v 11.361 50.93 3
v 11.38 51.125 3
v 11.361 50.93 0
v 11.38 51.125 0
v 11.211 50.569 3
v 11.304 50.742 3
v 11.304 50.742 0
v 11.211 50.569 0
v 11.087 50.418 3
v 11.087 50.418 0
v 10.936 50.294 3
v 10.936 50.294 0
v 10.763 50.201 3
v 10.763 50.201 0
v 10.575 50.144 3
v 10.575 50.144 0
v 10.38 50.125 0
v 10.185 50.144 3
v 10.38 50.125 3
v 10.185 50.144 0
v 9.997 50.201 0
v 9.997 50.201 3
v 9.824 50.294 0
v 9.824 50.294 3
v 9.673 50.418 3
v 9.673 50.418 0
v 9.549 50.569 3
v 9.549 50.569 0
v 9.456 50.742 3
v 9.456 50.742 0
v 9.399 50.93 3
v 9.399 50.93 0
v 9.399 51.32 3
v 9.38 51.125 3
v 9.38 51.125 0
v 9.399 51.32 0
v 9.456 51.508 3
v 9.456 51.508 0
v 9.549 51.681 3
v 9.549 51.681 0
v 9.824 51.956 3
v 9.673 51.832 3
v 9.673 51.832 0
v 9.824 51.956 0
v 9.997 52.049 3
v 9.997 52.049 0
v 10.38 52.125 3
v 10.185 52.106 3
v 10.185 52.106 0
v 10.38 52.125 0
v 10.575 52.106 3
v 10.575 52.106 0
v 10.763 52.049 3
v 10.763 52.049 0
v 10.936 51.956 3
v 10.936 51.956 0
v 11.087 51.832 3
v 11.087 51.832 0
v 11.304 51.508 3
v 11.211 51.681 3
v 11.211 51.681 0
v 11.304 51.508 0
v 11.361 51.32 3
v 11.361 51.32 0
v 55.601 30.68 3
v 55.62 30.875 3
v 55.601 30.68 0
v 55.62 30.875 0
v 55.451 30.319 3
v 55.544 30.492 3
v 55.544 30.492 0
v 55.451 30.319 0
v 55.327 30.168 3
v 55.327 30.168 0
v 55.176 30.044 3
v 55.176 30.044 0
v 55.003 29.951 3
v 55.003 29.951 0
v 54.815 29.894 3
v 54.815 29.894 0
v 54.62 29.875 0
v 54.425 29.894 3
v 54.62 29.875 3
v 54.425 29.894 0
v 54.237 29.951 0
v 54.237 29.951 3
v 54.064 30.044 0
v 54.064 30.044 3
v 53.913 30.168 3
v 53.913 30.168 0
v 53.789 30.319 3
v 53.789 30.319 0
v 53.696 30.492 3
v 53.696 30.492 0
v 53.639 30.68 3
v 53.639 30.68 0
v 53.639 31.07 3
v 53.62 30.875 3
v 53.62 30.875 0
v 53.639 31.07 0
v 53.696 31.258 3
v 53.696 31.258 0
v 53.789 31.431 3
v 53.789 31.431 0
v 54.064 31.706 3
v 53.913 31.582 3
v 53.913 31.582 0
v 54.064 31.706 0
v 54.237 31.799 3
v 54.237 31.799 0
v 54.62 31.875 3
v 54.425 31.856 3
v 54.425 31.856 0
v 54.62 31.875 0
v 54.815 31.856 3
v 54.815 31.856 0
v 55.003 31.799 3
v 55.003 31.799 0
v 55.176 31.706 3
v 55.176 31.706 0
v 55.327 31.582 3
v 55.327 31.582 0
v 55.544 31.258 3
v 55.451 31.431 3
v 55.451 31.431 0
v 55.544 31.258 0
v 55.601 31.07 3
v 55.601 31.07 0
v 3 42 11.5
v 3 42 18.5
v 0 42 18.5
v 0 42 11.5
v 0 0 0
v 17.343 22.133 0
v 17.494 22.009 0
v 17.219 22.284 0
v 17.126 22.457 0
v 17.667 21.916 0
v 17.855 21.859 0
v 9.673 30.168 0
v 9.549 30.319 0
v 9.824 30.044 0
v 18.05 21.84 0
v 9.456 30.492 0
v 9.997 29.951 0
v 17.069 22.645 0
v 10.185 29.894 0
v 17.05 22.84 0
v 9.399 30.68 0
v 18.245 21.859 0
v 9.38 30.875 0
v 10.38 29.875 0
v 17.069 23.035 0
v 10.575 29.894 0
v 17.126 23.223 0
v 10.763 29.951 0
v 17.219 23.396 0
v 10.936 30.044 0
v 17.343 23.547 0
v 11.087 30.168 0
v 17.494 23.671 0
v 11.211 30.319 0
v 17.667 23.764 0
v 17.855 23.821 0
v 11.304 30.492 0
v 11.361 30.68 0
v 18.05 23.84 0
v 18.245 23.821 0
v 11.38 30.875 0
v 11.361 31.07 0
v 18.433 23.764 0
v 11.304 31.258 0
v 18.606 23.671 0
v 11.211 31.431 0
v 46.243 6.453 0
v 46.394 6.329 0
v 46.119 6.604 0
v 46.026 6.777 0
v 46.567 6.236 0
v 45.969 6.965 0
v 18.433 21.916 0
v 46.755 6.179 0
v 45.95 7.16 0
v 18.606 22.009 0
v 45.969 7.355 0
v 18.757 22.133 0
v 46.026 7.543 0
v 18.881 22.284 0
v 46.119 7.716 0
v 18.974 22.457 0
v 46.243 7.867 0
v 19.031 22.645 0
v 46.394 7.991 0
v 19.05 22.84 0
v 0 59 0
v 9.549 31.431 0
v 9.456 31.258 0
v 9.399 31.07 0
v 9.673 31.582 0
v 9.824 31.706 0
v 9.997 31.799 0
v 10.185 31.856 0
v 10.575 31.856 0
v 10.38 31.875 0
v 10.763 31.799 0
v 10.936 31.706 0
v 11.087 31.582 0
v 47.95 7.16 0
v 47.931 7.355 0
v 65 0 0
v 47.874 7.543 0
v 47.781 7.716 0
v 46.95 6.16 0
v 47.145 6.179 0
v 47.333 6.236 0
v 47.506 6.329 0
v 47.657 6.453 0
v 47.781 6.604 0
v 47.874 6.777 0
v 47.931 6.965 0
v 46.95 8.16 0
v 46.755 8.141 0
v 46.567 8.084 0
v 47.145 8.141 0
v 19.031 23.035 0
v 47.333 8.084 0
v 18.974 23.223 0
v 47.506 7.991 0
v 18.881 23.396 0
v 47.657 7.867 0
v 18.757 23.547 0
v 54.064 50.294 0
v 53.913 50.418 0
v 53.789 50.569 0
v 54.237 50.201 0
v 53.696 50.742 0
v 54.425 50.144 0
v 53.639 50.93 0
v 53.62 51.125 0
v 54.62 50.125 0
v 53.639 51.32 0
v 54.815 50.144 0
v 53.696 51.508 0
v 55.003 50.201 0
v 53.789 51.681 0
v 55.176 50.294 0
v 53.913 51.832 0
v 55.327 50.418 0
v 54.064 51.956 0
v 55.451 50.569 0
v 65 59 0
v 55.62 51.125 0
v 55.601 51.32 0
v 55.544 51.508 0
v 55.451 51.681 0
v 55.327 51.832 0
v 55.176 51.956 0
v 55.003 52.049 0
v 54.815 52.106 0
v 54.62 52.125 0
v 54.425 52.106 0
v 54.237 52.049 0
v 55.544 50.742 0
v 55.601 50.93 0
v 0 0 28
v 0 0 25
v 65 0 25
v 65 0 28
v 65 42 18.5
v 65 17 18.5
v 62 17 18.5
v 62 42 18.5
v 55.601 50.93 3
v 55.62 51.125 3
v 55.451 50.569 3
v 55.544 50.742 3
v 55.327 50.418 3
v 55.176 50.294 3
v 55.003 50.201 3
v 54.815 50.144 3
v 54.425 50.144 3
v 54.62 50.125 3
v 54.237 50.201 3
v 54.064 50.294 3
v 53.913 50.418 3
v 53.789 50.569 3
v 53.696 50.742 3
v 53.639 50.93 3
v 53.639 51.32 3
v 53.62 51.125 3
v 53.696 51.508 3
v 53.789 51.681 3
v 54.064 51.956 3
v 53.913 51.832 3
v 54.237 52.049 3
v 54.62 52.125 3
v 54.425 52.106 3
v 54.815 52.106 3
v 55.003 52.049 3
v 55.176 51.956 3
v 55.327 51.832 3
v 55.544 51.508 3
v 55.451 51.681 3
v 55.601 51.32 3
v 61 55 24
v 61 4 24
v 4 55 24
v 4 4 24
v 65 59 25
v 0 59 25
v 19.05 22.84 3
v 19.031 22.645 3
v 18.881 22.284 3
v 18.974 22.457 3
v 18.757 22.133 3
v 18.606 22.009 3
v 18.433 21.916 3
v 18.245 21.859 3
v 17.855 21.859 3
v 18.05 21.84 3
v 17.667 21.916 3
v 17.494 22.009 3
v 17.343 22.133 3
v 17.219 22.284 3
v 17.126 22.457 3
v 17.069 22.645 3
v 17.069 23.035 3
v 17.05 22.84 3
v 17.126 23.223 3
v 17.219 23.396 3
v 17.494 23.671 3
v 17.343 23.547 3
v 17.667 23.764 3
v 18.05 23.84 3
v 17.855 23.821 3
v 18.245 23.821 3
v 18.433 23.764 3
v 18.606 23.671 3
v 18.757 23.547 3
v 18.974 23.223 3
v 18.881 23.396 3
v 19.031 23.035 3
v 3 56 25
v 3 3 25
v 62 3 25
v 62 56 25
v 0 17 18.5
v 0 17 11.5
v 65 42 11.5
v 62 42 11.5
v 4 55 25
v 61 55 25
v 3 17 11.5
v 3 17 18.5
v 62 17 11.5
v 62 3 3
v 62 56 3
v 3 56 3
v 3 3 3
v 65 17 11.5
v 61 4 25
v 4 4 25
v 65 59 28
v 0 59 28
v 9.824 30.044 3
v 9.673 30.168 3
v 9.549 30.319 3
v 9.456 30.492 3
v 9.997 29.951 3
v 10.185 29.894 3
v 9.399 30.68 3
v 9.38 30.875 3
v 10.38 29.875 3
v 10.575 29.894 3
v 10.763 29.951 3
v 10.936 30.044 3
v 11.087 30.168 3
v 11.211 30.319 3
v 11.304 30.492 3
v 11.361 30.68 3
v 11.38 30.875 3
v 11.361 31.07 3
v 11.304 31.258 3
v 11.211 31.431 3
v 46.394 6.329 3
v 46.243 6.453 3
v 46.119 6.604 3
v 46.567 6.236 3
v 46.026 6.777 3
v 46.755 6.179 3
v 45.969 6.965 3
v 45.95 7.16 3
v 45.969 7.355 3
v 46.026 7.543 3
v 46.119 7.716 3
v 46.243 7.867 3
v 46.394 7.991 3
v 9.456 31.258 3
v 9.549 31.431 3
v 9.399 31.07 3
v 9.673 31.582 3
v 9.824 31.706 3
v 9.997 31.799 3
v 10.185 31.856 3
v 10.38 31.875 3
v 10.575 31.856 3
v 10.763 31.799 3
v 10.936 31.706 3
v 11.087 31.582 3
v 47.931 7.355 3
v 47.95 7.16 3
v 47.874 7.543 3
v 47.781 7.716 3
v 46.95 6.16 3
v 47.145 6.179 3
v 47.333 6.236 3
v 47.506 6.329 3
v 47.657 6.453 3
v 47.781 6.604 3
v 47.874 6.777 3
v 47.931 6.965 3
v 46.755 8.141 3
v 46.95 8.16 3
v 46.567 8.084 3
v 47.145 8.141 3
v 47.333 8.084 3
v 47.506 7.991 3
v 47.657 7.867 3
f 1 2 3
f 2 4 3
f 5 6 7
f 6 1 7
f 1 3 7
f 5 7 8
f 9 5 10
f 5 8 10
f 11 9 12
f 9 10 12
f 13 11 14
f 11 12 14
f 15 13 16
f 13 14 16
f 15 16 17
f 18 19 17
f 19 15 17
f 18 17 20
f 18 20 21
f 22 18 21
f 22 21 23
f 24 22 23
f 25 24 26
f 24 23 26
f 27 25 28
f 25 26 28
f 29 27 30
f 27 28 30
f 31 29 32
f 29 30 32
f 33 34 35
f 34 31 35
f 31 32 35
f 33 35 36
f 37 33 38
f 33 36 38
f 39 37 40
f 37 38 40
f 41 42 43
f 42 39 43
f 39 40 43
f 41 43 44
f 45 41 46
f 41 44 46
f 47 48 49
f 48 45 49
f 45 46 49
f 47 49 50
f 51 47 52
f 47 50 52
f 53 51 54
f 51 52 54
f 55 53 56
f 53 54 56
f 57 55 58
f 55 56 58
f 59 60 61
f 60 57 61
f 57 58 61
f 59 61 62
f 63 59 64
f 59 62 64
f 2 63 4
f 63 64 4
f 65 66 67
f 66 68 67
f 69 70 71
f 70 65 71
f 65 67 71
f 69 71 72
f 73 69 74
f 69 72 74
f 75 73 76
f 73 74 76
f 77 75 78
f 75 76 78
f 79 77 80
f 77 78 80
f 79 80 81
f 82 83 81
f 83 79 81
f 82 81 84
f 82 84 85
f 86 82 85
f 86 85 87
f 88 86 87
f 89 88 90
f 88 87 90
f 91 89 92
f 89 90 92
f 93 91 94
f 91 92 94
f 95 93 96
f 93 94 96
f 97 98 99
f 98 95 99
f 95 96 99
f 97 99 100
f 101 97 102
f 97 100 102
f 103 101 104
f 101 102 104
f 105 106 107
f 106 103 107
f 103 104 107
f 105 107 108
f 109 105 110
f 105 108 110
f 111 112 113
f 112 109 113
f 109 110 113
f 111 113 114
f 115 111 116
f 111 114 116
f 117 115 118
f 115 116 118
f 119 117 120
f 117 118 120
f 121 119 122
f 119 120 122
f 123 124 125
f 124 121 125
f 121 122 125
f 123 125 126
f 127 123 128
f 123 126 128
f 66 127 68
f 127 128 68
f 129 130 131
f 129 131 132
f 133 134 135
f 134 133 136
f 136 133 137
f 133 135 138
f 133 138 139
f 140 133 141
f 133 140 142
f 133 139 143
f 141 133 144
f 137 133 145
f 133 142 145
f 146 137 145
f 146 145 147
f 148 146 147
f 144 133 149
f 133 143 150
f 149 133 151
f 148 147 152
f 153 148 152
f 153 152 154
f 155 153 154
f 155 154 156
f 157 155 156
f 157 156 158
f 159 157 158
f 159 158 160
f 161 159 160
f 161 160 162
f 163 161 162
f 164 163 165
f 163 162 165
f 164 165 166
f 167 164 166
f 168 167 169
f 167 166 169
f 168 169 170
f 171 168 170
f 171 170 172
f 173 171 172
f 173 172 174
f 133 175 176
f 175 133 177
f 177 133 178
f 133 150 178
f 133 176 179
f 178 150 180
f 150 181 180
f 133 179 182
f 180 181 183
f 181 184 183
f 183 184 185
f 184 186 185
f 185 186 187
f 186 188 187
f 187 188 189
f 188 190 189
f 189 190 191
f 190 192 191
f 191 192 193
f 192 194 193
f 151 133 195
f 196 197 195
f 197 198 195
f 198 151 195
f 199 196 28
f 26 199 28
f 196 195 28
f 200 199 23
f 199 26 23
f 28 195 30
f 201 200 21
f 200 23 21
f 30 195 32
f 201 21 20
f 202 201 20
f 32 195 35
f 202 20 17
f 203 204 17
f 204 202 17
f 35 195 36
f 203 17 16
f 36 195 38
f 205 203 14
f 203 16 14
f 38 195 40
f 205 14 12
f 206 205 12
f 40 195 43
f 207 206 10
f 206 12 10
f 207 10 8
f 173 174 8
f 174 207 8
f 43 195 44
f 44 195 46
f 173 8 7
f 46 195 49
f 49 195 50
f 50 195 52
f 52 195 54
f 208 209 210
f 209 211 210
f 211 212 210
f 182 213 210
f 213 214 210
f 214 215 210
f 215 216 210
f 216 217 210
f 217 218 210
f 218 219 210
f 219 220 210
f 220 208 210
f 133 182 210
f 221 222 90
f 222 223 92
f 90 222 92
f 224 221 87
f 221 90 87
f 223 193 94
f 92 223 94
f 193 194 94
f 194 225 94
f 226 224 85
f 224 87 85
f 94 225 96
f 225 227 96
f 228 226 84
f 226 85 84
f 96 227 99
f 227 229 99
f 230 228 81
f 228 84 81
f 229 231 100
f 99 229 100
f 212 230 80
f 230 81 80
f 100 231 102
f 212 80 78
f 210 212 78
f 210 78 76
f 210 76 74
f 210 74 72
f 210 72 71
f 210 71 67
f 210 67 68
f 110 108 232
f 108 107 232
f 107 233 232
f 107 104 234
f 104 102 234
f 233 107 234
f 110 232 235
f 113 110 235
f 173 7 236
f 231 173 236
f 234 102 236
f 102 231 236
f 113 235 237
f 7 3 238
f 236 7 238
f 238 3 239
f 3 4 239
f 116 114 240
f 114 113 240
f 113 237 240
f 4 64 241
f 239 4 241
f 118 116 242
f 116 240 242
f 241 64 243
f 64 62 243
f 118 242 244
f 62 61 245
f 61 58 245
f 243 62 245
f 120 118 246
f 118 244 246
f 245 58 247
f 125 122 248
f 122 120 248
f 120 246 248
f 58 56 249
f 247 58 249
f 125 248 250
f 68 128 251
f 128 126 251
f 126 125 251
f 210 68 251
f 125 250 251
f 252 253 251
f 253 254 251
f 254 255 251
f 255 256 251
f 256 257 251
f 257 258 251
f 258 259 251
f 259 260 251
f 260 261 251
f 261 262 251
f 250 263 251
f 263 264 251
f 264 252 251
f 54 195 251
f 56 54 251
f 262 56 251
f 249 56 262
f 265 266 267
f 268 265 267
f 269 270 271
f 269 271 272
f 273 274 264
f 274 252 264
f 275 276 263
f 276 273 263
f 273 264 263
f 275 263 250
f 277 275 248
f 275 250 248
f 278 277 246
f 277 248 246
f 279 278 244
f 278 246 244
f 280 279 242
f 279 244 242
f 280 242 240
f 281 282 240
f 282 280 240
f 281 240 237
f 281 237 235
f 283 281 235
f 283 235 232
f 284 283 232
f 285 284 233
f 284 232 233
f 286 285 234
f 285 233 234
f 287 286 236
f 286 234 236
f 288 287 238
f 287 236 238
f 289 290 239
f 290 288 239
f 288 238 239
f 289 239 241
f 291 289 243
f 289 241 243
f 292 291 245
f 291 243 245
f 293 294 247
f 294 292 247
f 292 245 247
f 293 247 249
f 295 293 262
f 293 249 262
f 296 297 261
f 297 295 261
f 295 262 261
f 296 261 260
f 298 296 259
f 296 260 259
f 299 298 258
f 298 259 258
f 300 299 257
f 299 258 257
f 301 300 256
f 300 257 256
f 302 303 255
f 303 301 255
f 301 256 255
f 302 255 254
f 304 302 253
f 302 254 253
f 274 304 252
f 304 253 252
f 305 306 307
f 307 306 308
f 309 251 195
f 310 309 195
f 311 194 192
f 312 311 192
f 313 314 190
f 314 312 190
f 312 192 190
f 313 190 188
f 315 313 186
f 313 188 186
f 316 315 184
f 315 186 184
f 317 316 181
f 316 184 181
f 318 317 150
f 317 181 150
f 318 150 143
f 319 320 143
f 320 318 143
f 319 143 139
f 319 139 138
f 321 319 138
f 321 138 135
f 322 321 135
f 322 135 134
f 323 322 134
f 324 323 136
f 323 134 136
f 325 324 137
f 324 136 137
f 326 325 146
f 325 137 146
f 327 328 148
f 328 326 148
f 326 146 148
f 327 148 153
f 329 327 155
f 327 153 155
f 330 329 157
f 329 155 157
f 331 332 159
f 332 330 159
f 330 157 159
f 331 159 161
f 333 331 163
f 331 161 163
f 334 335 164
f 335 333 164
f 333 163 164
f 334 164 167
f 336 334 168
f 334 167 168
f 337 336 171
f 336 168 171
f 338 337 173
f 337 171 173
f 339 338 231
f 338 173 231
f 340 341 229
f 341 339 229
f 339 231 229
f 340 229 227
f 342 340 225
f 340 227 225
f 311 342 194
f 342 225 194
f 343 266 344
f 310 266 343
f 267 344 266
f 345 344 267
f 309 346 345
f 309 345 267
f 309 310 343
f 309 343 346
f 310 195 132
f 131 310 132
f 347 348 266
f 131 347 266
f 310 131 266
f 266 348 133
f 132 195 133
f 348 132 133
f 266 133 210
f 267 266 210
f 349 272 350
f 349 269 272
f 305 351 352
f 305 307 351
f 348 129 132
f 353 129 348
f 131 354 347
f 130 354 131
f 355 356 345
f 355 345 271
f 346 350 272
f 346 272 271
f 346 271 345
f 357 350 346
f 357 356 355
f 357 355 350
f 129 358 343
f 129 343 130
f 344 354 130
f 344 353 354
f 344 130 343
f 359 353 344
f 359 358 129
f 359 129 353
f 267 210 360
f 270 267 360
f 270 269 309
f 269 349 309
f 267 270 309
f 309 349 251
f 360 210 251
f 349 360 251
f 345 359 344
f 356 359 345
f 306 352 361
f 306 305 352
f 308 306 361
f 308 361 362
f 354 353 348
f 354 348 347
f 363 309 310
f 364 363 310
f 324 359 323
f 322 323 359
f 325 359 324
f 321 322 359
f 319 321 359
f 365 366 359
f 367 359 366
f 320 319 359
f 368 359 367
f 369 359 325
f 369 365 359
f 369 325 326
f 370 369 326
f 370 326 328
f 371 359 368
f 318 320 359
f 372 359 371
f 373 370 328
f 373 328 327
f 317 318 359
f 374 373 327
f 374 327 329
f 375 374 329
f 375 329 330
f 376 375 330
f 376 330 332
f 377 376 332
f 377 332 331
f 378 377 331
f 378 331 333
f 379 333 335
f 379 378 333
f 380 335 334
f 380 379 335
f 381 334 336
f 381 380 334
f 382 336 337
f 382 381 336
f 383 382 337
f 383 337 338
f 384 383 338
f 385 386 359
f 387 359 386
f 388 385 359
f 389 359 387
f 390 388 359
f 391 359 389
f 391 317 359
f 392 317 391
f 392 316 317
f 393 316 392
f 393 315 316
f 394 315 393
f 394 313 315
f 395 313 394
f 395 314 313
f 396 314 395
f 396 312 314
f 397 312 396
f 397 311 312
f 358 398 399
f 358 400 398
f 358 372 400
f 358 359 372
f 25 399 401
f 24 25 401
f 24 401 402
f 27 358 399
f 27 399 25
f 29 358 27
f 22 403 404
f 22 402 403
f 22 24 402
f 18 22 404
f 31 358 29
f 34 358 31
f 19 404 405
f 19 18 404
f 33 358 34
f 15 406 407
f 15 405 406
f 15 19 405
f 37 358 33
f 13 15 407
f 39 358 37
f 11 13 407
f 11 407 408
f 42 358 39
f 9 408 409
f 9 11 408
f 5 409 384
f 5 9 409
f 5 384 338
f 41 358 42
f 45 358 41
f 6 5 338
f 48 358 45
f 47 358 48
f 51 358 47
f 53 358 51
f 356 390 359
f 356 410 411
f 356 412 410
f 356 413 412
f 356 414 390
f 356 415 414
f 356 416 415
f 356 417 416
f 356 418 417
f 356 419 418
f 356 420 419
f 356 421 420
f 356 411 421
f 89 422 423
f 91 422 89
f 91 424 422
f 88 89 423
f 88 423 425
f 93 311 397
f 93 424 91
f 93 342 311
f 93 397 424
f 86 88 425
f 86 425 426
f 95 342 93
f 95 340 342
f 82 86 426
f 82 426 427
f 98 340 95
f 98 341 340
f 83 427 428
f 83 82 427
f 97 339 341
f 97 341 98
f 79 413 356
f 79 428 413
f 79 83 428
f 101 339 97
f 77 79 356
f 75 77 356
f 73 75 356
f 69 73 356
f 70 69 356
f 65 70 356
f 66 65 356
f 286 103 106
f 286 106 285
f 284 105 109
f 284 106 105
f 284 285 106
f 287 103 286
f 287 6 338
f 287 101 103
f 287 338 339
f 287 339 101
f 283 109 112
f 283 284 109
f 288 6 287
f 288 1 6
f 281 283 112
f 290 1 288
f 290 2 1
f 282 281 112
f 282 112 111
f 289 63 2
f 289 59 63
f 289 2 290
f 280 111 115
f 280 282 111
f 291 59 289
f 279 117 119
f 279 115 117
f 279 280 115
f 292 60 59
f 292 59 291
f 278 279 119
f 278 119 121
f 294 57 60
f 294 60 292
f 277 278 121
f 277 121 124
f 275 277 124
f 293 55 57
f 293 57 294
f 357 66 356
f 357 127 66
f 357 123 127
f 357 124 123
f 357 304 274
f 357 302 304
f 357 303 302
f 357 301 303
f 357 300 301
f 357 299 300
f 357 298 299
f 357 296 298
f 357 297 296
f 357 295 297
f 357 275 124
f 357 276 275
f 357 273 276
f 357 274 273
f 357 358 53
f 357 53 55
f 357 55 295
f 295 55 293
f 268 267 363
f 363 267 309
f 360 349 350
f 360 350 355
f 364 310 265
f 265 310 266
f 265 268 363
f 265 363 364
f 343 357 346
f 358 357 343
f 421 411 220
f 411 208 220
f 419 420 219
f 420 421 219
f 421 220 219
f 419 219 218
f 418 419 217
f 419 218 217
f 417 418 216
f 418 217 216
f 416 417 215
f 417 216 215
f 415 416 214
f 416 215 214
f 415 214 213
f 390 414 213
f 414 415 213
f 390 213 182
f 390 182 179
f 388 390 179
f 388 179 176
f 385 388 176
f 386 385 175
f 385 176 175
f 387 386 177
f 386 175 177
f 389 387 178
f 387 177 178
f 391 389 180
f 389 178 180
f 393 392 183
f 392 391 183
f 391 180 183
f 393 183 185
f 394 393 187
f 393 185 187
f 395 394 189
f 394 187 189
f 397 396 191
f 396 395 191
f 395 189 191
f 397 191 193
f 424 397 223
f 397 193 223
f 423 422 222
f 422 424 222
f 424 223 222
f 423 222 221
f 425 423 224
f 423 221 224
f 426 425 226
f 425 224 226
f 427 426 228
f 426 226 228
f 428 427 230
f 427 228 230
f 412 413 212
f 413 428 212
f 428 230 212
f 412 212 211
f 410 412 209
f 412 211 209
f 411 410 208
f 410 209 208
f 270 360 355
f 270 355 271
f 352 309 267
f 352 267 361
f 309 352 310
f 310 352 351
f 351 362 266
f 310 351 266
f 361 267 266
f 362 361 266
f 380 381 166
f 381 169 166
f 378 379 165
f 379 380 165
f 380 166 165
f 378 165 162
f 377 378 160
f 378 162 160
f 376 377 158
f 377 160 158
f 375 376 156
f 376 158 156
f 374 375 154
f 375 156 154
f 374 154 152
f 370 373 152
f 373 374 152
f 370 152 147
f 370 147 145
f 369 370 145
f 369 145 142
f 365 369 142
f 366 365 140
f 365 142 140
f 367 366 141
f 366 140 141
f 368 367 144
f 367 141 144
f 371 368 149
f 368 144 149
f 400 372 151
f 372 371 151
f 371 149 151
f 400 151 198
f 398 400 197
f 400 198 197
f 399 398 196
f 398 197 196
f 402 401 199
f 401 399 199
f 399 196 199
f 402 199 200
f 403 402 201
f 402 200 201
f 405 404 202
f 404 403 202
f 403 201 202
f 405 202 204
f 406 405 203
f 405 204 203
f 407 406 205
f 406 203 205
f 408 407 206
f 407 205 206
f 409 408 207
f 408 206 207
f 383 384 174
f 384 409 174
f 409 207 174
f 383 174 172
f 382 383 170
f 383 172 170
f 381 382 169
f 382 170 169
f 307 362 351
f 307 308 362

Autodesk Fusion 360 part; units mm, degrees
sketch "Skizze1" plane through (0, 0, 0) normal (0, 0, 1) x (1, 0, 0) in component "power-switch"
  line L0 (0, 0) -> (65, 0)
  line L1 (65, 0) -> (65, 59)
  line L2 (65, 59) -> (0, 59)
  line L3 (0, 59) -> (0, 0)
  line L4 (32.5, 59) -> (32.5, 0) construction
  line L5 (54.62, 30.875) -> (10.38, 30.875) construction
  line L6 (10.38, 30.875) -> (10.38, 51.125) construction
  line L7 (10.38, 51.125) -> (54.62, 51.125) construction
  line L8 (54.62, 51.125) -> (54.62, 30.875) construction
  line L9 (54.62, 30.875) -> (10.38, 51.125) construction
  line L10 (10.38, 30.875) -> (54.62, 51.125) construction
  line L11 (57.62, 27.875) -> (7.38, 27.875) construction
  line L12 (7.38, 27.875) -> (7.38, 54.125) construction
  line L13 (7.38, 54.125) -> (57.62, 54.125) construction
  line L14 (57.62, 54.125) -> (57.62, 27.875) construction
  line L15 (57.62, 27.875) -> (7.38, 54.125) construction
  line L16 (7.38, 27.875) -> (57.62, 54.125) construction
  line L17 (53.59, 4.45) -> (11.41, 4.45) construction
  line L18 (11.41, 4.45) -> (11.41, 25.55) construction
  line L19 (11.41, 25.55) -> (53.59, 25.55) construction
  line L20 (53.59, 25.55) -> (53.59, 4.45) construction
  line L21 (53.59, 4.45) -> (11.41, 25.55) construction
  line L22 (11.41, 4.45) -> (53.59, 25.55) construction
  line L23 (46.95, 22.84) -> (18.05, 22.84) construction
  line L24 (18.05, 22.84) -> (18.05, 7.16) construction
  line L25 (18.05, 7.16) -> (46.95, 7.16) construction
  line L26 (46.95, 7.16) -> (46.95, 22.84) construction
  line L27 (46.95, 22.84) -> (18.05, 7.16) construction
  line L28 (18.05, 22.84) -> (46.95, 7.16) construction
  circle A0 centre (46.95, 7.16) radius 1
  circle A1 centre (18.05, 22.84) radius 1
  circle A2 centre (10.38, 51.125) radius 1
  circle A3 centre (54.62, 30.875) radius 1
  circle A4 centre (54.62, 51.125) radius 1
  circle A5 centre (10.38, 30.875) radius 1
  line L29 (3, 3) -> (62, 3)
  line L30 (62, 3) -> (62, 56)
  line L31 (62, 56) -> (3, 56)
  line L32 (3, 56) -> (3, 3)
  point P0 (32.5, 41)
  point P1 (32.5, 41)
  point P2 (32.5, 15)
  point P3 (32.5, 15)
  dimension "d56" = 50.24
  dimension "d57" = 26.25
  dimension "d58" = 3
  dimension "d59" = 3
  dimension "d60" = 21.1
  dimension "d61" = 42.18
  dimension "d62" = 6.64
  dimension "d63" = 2.71
  dimension "d64" = 2
  dimension "d65" = 2
  dimension "d66" = 2
  dimension "d67" = 2
  dimension "d68" = 2
  dimension "d69" = 2
  dimension "d70" = 15
  dimension "d71" = 18
  dimension "d72" = 26
  dimension "d73" = 65
  dimension "d74" = -3
extrude "Extrusion1" add sketch "Skizze1" along normal blind 3 contours L29 L30 L31 L32 makes body 1 in component "power-switch"
extrude "Extrusion2" add sketch "Skizze1" along normal blind 25 contours L0 L1 L2 L3 bodies 1 in component "power-switch"
sketch "Skizze2" plane through (0, 0, 25) normal (0, 0, 1) x (-1, 0, 0) in component "power-switch"
  line L0 (-3, -3) -> (-3, -56)
  line L1 (-3, -56) -> (-62, -56)
  line L2 (-62, -56) -> (-62, -3)
  line L3 (-62, -3) -> (-3, -3)
  line L4 (0, -59) -> (0, 0)
  line L5 (0, 0) -> (-65, 0)
  line L6 (-65, 0) -> (-65, -59)
  line L7 (-65, -59) -> (0, -59)
  line L8 (-61, -4) -> (-4, -4)
  line L9 (-4, -4) -> (-4, -55)
  line L10 (-4, -55) -> (-61, -55)
  line L11 (-61, -55) -> (-61, -4)
  dimension "d79" = 1
extrude "Extrusion3" add sketch "Skizze2" along normal blind 4 from surface at -1 separate body contours L8 L9 L10 L11 makes body 2 in component "power-switch"
extrude "Extrusion4" add sketch "Skizze2" along normal blind 3 contours L0 L1 L2 L3 | L4 L5 L6 L7 bodies 2 in component "power-switch"
sketch "Skizze3" plane through (65, 0, 0) normal (1, 0, 0) x (0, 1, 0) in component "power-switch"
  line L0 (0, 0) -> (59, 0)
  line L1 (59, 0) -> (59, 25)
  line L2 (59, 25) -> (0, 25)
  line L3 (0, 25) -> (0, 0)
  line L4 (42, 11.5) -> (17, 11.5)
  line L5 (17, 11.5) -> (17, 18.5)
  line L6 (17, 18.5) -> (42, 18.5)
  line L7 (42, 18.5) -> (42, 11.5)
  line L8 (42, 11.5) -> (17, 18.5) construction
  line L9 (17, 11.5) -> (42, 18.5) construction
  line L10 (0, 15) -> (59, 15) construction
  point P0 (29.5, 15)
  dimension "d85" = 25
  dimension "d86" = 7
  dimension "d87" = 10
extrude "Extrusion5" cut sketch "Skizze3" against normal blind 70 contours L4 L5 L6 L7 bodies 1 in component "power-switch"
component "power-switch" placed x (1, 0, 0) y (0, 1, 0) z (0, 0, 1) at (0, 0, 0)
